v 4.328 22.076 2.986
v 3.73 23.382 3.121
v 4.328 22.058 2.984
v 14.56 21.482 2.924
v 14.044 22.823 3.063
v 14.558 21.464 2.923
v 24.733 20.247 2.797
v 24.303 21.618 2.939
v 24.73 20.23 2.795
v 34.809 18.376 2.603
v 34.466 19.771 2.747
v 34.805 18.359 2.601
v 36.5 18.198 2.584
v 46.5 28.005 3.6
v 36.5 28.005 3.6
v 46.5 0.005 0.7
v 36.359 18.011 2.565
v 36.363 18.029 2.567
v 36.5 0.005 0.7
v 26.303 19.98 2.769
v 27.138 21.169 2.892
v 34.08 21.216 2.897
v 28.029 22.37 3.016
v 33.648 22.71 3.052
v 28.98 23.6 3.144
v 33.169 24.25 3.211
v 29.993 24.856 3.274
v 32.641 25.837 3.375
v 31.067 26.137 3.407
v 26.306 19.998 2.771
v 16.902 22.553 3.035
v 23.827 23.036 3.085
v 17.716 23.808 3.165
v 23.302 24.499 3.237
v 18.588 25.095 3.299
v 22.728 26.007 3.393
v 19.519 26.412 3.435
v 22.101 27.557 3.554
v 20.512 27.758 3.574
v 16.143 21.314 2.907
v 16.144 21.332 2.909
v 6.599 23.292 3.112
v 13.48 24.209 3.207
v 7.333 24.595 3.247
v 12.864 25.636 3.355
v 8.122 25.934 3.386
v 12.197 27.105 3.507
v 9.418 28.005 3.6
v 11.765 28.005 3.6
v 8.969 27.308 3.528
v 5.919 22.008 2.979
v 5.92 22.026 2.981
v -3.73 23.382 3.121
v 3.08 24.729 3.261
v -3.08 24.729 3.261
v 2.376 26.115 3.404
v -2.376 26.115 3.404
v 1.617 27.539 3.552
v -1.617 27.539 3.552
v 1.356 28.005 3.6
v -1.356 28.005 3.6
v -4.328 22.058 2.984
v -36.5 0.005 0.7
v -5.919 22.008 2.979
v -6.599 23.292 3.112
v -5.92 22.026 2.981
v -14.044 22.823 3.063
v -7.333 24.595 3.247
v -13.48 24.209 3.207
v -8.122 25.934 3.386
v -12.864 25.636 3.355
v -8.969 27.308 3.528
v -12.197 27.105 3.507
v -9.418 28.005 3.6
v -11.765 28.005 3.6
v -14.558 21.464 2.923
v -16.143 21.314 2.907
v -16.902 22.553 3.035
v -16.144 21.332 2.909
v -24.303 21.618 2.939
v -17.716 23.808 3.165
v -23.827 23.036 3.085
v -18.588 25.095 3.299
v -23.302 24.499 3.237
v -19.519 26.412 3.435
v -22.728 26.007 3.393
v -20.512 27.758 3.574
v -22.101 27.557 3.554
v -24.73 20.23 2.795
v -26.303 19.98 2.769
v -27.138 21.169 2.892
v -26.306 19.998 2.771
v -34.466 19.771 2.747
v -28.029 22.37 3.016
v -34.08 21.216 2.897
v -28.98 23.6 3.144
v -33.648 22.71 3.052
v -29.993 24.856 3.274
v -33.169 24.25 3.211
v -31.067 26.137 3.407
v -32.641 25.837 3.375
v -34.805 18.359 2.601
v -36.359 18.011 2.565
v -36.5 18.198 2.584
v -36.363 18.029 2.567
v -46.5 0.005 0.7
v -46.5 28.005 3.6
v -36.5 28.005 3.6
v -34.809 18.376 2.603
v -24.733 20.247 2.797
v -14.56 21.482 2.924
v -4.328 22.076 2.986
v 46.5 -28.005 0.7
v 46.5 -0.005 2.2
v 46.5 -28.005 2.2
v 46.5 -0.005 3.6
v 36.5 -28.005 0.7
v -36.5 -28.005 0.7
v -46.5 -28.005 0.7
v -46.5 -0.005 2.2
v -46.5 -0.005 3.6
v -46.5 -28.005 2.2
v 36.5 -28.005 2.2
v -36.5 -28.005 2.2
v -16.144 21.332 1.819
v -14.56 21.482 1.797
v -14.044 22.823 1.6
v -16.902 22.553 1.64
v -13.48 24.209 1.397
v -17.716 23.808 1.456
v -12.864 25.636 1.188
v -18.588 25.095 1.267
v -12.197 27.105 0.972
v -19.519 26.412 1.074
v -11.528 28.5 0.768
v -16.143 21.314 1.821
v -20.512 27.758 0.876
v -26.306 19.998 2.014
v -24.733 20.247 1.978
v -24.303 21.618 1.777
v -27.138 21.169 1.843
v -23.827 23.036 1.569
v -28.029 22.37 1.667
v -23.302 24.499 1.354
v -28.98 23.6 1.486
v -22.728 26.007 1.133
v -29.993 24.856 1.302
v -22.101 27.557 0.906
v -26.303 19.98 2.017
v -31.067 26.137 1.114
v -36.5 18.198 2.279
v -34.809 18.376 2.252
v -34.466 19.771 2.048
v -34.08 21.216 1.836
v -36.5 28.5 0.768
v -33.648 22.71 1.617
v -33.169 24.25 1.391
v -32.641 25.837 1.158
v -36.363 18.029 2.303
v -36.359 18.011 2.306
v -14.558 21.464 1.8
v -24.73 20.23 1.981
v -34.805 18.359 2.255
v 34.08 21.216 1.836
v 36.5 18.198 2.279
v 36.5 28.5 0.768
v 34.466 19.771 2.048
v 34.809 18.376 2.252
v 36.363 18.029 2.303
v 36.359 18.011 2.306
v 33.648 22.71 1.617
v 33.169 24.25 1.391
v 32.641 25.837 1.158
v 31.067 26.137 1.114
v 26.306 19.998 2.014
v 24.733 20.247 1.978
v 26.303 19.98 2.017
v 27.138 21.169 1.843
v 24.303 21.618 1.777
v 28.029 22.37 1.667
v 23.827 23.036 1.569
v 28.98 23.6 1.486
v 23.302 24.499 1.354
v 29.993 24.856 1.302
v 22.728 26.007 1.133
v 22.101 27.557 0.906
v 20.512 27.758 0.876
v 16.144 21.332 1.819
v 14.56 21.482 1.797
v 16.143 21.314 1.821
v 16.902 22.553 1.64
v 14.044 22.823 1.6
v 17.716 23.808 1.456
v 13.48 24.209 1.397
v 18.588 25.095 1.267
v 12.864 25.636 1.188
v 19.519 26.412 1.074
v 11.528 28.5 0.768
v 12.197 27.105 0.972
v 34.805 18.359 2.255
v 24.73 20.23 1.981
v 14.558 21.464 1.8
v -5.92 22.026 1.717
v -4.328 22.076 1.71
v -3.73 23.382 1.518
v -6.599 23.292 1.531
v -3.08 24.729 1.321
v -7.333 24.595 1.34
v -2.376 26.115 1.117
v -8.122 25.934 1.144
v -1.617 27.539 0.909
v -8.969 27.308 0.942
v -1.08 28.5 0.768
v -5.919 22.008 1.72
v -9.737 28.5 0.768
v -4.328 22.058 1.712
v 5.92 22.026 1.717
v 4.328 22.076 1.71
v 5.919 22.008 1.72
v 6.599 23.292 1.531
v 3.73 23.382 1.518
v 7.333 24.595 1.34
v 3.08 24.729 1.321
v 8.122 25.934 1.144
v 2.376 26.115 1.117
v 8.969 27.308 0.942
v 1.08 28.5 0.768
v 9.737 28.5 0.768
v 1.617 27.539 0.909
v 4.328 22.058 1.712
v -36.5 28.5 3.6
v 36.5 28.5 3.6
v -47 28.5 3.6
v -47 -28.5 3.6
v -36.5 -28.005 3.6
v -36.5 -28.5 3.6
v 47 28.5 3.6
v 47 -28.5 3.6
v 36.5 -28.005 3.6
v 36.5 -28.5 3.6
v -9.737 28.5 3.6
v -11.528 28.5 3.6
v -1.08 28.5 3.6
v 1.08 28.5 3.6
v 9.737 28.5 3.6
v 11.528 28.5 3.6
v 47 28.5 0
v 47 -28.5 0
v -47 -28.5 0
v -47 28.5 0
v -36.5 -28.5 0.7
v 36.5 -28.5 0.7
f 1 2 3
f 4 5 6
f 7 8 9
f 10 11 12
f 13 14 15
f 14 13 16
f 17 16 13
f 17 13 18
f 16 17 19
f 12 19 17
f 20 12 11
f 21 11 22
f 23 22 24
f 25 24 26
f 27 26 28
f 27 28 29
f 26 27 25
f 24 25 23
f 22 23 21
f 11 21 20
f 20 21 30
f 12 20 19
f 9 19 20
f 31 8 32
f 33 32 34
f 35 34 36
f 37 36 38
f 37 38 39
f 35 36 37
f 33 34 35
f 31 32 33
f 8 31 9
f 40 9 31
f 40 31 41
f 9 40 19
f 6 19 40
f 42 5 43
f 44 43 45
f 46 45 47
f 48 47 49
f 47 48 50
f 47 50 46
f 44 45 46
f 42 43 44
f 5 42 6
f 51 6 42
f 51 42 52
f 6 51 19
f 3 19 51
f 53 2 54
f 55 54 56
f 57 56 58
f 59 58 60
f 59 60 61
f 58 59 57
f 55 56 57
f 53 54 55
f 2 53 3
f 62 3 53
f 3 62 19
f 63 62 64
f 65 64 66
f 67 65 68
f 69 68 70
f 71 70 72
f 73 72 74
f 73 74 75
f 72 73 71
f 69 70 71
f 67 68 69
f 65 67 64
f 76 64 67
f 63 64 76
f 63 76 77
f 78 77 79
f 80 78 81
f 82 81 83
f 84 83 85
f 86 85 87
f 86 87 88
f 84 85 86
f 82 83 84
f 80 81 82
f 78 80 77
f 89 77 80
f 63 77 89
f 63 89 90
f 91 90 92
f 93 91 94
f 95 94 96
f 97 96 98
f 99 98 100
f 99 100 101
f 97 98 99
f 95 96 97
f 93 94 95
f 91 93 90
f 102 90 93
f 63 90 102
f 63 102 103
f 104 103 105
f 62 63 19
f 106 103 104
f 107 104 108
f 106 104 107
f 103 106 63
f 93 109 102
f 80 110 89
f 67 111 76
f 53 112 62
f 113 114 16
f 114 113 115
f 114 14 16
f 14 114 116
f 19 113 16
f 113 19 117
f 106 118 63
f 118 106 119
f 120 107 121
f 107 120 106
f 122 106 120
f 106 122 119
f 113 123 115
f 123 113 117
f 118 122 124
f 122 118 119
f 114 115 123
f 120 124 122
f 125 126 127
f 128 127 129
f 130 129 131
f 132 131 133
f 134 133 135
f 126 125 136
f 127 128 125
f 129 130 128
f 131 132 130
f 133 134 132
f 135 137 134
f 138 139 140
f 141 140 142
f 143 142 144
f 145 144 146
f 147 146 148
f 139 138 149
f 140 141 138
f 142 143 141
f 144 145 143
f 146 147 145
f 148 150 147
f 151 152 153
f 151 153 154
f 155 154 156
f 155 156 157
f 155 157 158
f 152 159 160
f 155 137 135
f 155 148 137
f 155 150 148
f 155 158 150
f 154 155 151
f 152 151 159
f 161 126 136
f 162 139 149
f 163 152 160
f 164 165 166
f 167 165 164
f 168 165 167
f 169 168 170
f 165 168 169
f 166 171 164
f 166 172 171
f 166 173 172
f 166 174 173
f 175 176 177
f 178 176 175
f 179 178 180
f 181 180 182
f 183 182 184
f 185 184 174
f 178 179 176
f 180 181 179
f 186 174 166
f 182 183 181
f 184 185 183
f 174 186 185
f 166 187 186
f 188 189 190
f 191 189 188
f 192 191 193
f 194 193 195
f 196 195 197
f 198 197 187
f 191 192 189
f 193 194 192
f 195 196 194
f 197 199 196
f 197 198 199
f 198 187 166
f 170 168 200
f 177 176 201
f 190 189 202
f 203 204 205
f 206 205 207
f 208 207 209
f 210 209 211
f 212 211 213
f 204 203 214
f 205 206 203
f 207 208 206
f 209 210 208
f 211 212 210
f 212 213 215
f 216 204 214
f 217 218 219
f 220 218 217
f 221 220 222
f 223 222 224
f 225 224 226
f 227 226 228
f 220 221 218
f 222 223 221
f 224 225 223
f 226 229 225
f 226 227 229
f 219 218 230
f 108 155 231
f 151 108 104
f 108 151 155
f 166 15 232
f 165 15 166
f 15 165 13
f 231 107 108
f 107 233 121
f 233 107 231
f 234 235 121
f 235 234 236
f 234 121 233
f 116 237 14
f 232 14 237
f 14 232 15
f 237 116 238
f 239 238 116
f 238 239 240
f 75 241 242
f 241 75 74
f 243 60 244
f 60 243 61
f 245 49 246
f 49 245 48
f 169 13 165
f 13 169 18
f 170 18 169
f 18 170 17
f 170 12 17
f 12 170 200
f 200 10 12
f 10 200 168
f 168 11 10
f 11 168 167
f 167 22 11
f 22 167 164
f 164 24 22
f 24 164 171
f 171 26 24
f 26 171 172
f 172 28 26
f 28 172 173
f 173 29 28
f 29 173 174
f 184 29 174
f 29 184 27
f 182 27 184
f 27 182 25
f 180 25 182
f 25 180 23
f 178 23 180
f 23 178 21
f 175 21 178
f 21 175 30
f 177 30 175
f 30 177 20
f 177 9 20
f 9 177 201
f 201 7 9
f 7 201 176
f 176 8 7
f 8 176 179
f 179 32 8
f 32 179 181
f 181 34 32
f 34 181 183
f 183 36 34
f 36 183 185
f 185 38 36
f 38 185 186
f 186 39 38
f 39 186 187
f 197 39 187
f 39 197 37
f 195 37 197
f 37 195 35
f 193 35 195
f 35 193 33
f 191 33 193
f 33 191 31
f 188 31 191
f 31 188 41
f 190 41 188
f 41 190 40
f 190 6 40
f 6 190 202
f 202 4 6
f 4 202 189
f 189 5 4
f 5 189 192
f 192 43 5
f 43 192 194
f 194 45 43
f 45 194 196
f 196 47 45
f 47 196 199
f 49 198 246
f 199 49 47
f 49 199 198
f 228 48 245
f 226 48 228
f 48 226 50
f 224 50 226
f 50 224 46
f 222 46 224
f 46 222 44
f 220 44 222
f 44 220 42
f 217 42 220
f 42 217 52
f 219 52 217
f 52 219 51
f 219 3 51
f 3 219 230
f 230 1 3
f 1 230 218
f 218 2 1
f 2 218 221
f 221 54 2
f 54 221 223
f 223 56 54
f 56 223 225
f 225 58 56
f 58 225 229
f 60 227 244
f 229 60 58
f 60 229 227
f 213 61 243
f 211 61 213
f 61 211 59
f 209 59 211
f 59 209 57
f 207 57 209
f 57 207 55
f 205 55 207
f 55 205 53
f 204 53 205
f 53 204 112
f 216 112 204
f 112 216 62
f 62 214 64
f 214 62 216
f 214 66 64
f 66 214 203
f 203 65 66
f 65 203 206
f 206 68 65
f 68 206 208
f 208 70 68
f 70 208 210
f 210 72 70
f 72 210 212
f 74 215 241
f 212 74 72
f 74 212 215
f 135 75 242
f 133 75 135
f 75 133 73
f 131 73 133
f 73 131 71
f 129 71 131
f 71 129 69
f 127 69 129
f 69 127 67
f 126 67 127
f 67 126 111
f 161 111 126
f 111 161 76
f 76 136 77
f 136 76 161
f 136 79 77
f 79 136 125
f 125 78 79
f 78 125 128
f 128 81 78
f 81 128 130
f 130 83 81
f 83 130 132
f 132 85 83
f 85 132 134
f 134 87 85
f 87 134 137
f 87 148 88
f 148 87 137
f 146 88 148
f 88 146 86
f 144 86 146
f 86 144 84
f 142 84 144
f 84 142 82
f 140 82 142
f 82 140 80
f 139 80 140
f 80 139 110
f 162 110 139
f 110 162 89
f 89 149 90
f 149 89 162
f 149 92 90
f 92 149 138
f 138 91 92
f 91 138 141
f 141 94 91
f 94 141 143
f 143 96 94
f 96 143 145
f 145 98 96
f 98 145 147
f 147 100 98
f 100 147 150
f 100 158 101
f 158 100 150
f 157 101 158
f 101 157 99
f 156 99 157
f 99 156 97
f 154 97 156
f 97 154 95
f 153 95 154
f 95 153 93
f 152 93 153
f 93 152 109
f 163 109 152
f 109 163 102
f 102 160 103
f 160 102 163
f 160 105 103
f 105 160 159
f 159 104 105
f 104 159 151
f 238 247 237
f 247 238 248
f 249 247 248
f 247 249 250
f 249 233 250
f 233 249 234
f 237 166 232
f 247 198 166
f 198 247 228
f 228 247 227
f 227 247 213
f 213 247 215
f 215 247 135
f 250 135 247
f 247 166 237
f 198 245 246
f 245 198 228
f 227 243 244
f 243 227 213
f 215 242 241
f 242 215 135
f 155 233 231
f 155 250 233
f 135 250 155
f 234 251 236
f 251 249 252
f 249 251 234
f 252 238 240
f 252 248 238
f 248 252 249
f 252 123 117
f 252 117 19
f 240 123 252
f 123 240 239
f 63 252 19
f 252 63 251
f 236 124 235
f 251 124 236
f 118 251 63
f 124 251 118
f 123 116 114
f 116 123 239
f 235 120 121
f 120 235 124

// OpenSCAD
// Wall Mounted Single Card Holder
// By Brian Khuu 2022-04-10
// RevB is specifically for Alexar's request for gear style slopes
use <MCAD/involute_gears.scad>
use <MCAD/regular_shapes.scad>

print_layer_height = 0.2;

// Businesscard
// Default values based on https://www.mbe.com.au/what-is-the-standard-business-card-size-in-australia/
businesscard_width = 93; // 90mm but some in real life are more like 91mm (Plus 0.5 tol )
businesscard_height = 56; // 55mm (add 0.5mm tol)
businesscard_thickness = 1.5; // 0.25mm for thin paper cards. 0.8mm for thick plastic cards. We need to add extra thickness to account for layer droop

// Holder
wall_spacing = 1;
wall_card_grip = 20;
wall_x_count = 1; //2
wall_y_count = 1; //3

// Calc
wall_base = print_layer_height*3+0.1;
wall_top = print_layer_height*3+0.1;
wall_height = wall_base + businesscard_thickness + wall_top*2;

module simple_gear (
	number_of_teeth=15,
	circular_pitch=false, diametral_pitch=false,
	pressure_angle=28,
	clearance = 0.2,
	backlash=0,
	twist=0,
	involute_facets=0,
	flat=false)
{
    pi=3.1415926535897932384626433832795;
    
	if (circular_pitch==false && diametral_pitch==false)
		echo("MCAD ERROR: gear module needs either a diametral_pitch or circular_pitch");

	//Convert diametrial pitch to our native circular pitch
	circular_pitch = (circular_pitch!=false?circular_pitch:180/diametral_pitch);

	// Pitch diameter: Diameter of pitch circle.
	pitch_diameter  =  number_of_teeth * circular_pitch / 180;
	pitch_radius = pitch_diameter/2;
	echo ("Teeth:", number_of_teeth, " Pitch radius:", pitch_radius);

	// Base Circle
	base_radius = pitch_radius*cos(pressure_angle);

	// Diametrial pitch: Number of teeth per unit length.
	pitch_diametrial = number_of_teeth / pitch_diameter;

	// Addendum: Radial distance from pitch circle to outside circle.
	addendum = 1/pitch_diametrial;

	//Outer Circle
	outer_radius = pitch_radius+addendum;

	// Dedendum: Radial distance from pitch circle to root diameter
	dedendum = addendum + clearance;

	// Root diameter: Diameter of bottom of tooth spaces.
	root_radius = pitch_radius-dedendum;
	backlash_angle = backlash / pitch_radius * 180 / pi;
	half_thick_angle = (360 / number_of_teeth - backlash_angle) / 4;


    linear_exturde_flat_option(flat=flat, height=rim_thickness, convexity=10, twist=twist)
    gear_shape (
        number_of_teeth,
        pitch_radius = pitch_radius,
        root_radius = root_radius,
        base_radius = base_radius,
        outer_radius = outer_radius,
        half_thick_angle = half_thick_angle,
        involute_facets=involute_facets);
}

module cardSlopeOutline()
{
    hull()
    {
        translate([0,businesscard_height/2+1, wall_base])
        cube([businesscard_width-wall_card_grip, 0.01, 0.01], center = true);
        translate([0,businesscard_height/4,businesscard_thickness + wall_top*2])
        cube([businesscard_width-wall_card_grip, 0.01, 0.01], center = true);
    }
}

module cardWindowOutline()
{
    hull()
    {
        translate([0,businesscard_height/2,businesscard_thickness + wall_top*2])
        cube([businesscard_width, 0.01, 0.01], center = true);
        translate([0,0,0])
        cube([businesscard_width, 0.01, 0.01], center = true);
    }    
    hull()
    {
        translate([0,0,businesscard_thickness + wall_top*2])
        cube([businesscard_width, 0.01, 0.01], center = true);
        translate([0,-businesscard_height/2,0])
        cube([businesscard_width-wall_card_grip, 0.01, 0.01], center = true);
    }
}

module cardholder(reducePlastic=false)
{
    if (0)
    translate([0,0,wall_base+businesscard_thickness])
        rotate([2,0,0])
        %cube([85, 54, 0.1], center = true);

    difference()
    {
        translate([0,0,wall_height/2])
            cube([businesscard_width+wall_spacing, businesscard_height+wall_spacing, wall_height], center = true);
        
        // Card Slide
        translate([0,0,wall_base])
        translate([0,0,businesscard_thickness/2])
        {
            // Upper
            hull()
            {
                translate([0,businesscard_height/2,businesscard_thickness + wall_top*2])
                cube([businesscard_width, 0.01, businesscard_thickness], center = true);
                
                translate([0,0,0])
                cube([businesscard_width, 0.01, businesscard_thickness], center = true);
            }
            // Lower
            hull()
            {
                translate([0,-businesscard_height/2,0])
                cube([businesscard_width, 0.01, businesscard_thickness], center = true);
                cube([businesscard_width, 0.01, businesscard_thickness], center = true);
            }
        }
        
        // Grip
        translate([0,0,wall_height/2+wall_base])
            hull()
            {
                translate([0,0,0])
                cube([businesscard_width-wall_card_grip, 0.01, wall_height], center = true);
                
                translate([0,-businesscard_height,0])
                cube([businesscard_width-wall_card_grip, 0.01, wall_height], center = true);
            }
        
        
        // Card Window
        translate([0,0,wall_base+businesscard_thickness/2])
        {
            hull()
            {
                // Card Window Base
                cardWindowOutline();
                // Card Window Top
                translate([0,0,businesscard_thickness + wall_top * 2])
                    cardWindowOutline();
            }
        }
        
        // Card Slope
        difference()
        {
            translate([0,0,0])
            {
                hull()
                {
                    // Card Window Base
                    cardSlopeOutline();
                    // Card Window Top
                    translate([0,0,businesscard_thickness + wall_top * 2])
                        cardSlopeOutline();
                }
            }
            translate([0,-141,0])
                simple_gear(number_of_teeth=100, circular_pitch=600, rim_thickness = wall_height);
        }
        
        // Reduce Plastic
        if (reducePlastic)
        translate([0,0,wall_base+businesscard_thickness/2+0.5])
        {
            cube([businesscard_width-wall_card_grip,businesscard_height-10, wall_height+1], center=true);
        }
    }
}

if (wall_x_count == 1 && wall_y_count == 1)
{
    cardholder(false);
}
else
{
    for (x = [1: 1 : wall_x_count])
        for (y = [1 : 1 : wall_y_count])
           translate([x*(businesscard_width+wall_spacing), y*(businesscard_height+wall_spacing), 0])
                cardholder(false);
}
